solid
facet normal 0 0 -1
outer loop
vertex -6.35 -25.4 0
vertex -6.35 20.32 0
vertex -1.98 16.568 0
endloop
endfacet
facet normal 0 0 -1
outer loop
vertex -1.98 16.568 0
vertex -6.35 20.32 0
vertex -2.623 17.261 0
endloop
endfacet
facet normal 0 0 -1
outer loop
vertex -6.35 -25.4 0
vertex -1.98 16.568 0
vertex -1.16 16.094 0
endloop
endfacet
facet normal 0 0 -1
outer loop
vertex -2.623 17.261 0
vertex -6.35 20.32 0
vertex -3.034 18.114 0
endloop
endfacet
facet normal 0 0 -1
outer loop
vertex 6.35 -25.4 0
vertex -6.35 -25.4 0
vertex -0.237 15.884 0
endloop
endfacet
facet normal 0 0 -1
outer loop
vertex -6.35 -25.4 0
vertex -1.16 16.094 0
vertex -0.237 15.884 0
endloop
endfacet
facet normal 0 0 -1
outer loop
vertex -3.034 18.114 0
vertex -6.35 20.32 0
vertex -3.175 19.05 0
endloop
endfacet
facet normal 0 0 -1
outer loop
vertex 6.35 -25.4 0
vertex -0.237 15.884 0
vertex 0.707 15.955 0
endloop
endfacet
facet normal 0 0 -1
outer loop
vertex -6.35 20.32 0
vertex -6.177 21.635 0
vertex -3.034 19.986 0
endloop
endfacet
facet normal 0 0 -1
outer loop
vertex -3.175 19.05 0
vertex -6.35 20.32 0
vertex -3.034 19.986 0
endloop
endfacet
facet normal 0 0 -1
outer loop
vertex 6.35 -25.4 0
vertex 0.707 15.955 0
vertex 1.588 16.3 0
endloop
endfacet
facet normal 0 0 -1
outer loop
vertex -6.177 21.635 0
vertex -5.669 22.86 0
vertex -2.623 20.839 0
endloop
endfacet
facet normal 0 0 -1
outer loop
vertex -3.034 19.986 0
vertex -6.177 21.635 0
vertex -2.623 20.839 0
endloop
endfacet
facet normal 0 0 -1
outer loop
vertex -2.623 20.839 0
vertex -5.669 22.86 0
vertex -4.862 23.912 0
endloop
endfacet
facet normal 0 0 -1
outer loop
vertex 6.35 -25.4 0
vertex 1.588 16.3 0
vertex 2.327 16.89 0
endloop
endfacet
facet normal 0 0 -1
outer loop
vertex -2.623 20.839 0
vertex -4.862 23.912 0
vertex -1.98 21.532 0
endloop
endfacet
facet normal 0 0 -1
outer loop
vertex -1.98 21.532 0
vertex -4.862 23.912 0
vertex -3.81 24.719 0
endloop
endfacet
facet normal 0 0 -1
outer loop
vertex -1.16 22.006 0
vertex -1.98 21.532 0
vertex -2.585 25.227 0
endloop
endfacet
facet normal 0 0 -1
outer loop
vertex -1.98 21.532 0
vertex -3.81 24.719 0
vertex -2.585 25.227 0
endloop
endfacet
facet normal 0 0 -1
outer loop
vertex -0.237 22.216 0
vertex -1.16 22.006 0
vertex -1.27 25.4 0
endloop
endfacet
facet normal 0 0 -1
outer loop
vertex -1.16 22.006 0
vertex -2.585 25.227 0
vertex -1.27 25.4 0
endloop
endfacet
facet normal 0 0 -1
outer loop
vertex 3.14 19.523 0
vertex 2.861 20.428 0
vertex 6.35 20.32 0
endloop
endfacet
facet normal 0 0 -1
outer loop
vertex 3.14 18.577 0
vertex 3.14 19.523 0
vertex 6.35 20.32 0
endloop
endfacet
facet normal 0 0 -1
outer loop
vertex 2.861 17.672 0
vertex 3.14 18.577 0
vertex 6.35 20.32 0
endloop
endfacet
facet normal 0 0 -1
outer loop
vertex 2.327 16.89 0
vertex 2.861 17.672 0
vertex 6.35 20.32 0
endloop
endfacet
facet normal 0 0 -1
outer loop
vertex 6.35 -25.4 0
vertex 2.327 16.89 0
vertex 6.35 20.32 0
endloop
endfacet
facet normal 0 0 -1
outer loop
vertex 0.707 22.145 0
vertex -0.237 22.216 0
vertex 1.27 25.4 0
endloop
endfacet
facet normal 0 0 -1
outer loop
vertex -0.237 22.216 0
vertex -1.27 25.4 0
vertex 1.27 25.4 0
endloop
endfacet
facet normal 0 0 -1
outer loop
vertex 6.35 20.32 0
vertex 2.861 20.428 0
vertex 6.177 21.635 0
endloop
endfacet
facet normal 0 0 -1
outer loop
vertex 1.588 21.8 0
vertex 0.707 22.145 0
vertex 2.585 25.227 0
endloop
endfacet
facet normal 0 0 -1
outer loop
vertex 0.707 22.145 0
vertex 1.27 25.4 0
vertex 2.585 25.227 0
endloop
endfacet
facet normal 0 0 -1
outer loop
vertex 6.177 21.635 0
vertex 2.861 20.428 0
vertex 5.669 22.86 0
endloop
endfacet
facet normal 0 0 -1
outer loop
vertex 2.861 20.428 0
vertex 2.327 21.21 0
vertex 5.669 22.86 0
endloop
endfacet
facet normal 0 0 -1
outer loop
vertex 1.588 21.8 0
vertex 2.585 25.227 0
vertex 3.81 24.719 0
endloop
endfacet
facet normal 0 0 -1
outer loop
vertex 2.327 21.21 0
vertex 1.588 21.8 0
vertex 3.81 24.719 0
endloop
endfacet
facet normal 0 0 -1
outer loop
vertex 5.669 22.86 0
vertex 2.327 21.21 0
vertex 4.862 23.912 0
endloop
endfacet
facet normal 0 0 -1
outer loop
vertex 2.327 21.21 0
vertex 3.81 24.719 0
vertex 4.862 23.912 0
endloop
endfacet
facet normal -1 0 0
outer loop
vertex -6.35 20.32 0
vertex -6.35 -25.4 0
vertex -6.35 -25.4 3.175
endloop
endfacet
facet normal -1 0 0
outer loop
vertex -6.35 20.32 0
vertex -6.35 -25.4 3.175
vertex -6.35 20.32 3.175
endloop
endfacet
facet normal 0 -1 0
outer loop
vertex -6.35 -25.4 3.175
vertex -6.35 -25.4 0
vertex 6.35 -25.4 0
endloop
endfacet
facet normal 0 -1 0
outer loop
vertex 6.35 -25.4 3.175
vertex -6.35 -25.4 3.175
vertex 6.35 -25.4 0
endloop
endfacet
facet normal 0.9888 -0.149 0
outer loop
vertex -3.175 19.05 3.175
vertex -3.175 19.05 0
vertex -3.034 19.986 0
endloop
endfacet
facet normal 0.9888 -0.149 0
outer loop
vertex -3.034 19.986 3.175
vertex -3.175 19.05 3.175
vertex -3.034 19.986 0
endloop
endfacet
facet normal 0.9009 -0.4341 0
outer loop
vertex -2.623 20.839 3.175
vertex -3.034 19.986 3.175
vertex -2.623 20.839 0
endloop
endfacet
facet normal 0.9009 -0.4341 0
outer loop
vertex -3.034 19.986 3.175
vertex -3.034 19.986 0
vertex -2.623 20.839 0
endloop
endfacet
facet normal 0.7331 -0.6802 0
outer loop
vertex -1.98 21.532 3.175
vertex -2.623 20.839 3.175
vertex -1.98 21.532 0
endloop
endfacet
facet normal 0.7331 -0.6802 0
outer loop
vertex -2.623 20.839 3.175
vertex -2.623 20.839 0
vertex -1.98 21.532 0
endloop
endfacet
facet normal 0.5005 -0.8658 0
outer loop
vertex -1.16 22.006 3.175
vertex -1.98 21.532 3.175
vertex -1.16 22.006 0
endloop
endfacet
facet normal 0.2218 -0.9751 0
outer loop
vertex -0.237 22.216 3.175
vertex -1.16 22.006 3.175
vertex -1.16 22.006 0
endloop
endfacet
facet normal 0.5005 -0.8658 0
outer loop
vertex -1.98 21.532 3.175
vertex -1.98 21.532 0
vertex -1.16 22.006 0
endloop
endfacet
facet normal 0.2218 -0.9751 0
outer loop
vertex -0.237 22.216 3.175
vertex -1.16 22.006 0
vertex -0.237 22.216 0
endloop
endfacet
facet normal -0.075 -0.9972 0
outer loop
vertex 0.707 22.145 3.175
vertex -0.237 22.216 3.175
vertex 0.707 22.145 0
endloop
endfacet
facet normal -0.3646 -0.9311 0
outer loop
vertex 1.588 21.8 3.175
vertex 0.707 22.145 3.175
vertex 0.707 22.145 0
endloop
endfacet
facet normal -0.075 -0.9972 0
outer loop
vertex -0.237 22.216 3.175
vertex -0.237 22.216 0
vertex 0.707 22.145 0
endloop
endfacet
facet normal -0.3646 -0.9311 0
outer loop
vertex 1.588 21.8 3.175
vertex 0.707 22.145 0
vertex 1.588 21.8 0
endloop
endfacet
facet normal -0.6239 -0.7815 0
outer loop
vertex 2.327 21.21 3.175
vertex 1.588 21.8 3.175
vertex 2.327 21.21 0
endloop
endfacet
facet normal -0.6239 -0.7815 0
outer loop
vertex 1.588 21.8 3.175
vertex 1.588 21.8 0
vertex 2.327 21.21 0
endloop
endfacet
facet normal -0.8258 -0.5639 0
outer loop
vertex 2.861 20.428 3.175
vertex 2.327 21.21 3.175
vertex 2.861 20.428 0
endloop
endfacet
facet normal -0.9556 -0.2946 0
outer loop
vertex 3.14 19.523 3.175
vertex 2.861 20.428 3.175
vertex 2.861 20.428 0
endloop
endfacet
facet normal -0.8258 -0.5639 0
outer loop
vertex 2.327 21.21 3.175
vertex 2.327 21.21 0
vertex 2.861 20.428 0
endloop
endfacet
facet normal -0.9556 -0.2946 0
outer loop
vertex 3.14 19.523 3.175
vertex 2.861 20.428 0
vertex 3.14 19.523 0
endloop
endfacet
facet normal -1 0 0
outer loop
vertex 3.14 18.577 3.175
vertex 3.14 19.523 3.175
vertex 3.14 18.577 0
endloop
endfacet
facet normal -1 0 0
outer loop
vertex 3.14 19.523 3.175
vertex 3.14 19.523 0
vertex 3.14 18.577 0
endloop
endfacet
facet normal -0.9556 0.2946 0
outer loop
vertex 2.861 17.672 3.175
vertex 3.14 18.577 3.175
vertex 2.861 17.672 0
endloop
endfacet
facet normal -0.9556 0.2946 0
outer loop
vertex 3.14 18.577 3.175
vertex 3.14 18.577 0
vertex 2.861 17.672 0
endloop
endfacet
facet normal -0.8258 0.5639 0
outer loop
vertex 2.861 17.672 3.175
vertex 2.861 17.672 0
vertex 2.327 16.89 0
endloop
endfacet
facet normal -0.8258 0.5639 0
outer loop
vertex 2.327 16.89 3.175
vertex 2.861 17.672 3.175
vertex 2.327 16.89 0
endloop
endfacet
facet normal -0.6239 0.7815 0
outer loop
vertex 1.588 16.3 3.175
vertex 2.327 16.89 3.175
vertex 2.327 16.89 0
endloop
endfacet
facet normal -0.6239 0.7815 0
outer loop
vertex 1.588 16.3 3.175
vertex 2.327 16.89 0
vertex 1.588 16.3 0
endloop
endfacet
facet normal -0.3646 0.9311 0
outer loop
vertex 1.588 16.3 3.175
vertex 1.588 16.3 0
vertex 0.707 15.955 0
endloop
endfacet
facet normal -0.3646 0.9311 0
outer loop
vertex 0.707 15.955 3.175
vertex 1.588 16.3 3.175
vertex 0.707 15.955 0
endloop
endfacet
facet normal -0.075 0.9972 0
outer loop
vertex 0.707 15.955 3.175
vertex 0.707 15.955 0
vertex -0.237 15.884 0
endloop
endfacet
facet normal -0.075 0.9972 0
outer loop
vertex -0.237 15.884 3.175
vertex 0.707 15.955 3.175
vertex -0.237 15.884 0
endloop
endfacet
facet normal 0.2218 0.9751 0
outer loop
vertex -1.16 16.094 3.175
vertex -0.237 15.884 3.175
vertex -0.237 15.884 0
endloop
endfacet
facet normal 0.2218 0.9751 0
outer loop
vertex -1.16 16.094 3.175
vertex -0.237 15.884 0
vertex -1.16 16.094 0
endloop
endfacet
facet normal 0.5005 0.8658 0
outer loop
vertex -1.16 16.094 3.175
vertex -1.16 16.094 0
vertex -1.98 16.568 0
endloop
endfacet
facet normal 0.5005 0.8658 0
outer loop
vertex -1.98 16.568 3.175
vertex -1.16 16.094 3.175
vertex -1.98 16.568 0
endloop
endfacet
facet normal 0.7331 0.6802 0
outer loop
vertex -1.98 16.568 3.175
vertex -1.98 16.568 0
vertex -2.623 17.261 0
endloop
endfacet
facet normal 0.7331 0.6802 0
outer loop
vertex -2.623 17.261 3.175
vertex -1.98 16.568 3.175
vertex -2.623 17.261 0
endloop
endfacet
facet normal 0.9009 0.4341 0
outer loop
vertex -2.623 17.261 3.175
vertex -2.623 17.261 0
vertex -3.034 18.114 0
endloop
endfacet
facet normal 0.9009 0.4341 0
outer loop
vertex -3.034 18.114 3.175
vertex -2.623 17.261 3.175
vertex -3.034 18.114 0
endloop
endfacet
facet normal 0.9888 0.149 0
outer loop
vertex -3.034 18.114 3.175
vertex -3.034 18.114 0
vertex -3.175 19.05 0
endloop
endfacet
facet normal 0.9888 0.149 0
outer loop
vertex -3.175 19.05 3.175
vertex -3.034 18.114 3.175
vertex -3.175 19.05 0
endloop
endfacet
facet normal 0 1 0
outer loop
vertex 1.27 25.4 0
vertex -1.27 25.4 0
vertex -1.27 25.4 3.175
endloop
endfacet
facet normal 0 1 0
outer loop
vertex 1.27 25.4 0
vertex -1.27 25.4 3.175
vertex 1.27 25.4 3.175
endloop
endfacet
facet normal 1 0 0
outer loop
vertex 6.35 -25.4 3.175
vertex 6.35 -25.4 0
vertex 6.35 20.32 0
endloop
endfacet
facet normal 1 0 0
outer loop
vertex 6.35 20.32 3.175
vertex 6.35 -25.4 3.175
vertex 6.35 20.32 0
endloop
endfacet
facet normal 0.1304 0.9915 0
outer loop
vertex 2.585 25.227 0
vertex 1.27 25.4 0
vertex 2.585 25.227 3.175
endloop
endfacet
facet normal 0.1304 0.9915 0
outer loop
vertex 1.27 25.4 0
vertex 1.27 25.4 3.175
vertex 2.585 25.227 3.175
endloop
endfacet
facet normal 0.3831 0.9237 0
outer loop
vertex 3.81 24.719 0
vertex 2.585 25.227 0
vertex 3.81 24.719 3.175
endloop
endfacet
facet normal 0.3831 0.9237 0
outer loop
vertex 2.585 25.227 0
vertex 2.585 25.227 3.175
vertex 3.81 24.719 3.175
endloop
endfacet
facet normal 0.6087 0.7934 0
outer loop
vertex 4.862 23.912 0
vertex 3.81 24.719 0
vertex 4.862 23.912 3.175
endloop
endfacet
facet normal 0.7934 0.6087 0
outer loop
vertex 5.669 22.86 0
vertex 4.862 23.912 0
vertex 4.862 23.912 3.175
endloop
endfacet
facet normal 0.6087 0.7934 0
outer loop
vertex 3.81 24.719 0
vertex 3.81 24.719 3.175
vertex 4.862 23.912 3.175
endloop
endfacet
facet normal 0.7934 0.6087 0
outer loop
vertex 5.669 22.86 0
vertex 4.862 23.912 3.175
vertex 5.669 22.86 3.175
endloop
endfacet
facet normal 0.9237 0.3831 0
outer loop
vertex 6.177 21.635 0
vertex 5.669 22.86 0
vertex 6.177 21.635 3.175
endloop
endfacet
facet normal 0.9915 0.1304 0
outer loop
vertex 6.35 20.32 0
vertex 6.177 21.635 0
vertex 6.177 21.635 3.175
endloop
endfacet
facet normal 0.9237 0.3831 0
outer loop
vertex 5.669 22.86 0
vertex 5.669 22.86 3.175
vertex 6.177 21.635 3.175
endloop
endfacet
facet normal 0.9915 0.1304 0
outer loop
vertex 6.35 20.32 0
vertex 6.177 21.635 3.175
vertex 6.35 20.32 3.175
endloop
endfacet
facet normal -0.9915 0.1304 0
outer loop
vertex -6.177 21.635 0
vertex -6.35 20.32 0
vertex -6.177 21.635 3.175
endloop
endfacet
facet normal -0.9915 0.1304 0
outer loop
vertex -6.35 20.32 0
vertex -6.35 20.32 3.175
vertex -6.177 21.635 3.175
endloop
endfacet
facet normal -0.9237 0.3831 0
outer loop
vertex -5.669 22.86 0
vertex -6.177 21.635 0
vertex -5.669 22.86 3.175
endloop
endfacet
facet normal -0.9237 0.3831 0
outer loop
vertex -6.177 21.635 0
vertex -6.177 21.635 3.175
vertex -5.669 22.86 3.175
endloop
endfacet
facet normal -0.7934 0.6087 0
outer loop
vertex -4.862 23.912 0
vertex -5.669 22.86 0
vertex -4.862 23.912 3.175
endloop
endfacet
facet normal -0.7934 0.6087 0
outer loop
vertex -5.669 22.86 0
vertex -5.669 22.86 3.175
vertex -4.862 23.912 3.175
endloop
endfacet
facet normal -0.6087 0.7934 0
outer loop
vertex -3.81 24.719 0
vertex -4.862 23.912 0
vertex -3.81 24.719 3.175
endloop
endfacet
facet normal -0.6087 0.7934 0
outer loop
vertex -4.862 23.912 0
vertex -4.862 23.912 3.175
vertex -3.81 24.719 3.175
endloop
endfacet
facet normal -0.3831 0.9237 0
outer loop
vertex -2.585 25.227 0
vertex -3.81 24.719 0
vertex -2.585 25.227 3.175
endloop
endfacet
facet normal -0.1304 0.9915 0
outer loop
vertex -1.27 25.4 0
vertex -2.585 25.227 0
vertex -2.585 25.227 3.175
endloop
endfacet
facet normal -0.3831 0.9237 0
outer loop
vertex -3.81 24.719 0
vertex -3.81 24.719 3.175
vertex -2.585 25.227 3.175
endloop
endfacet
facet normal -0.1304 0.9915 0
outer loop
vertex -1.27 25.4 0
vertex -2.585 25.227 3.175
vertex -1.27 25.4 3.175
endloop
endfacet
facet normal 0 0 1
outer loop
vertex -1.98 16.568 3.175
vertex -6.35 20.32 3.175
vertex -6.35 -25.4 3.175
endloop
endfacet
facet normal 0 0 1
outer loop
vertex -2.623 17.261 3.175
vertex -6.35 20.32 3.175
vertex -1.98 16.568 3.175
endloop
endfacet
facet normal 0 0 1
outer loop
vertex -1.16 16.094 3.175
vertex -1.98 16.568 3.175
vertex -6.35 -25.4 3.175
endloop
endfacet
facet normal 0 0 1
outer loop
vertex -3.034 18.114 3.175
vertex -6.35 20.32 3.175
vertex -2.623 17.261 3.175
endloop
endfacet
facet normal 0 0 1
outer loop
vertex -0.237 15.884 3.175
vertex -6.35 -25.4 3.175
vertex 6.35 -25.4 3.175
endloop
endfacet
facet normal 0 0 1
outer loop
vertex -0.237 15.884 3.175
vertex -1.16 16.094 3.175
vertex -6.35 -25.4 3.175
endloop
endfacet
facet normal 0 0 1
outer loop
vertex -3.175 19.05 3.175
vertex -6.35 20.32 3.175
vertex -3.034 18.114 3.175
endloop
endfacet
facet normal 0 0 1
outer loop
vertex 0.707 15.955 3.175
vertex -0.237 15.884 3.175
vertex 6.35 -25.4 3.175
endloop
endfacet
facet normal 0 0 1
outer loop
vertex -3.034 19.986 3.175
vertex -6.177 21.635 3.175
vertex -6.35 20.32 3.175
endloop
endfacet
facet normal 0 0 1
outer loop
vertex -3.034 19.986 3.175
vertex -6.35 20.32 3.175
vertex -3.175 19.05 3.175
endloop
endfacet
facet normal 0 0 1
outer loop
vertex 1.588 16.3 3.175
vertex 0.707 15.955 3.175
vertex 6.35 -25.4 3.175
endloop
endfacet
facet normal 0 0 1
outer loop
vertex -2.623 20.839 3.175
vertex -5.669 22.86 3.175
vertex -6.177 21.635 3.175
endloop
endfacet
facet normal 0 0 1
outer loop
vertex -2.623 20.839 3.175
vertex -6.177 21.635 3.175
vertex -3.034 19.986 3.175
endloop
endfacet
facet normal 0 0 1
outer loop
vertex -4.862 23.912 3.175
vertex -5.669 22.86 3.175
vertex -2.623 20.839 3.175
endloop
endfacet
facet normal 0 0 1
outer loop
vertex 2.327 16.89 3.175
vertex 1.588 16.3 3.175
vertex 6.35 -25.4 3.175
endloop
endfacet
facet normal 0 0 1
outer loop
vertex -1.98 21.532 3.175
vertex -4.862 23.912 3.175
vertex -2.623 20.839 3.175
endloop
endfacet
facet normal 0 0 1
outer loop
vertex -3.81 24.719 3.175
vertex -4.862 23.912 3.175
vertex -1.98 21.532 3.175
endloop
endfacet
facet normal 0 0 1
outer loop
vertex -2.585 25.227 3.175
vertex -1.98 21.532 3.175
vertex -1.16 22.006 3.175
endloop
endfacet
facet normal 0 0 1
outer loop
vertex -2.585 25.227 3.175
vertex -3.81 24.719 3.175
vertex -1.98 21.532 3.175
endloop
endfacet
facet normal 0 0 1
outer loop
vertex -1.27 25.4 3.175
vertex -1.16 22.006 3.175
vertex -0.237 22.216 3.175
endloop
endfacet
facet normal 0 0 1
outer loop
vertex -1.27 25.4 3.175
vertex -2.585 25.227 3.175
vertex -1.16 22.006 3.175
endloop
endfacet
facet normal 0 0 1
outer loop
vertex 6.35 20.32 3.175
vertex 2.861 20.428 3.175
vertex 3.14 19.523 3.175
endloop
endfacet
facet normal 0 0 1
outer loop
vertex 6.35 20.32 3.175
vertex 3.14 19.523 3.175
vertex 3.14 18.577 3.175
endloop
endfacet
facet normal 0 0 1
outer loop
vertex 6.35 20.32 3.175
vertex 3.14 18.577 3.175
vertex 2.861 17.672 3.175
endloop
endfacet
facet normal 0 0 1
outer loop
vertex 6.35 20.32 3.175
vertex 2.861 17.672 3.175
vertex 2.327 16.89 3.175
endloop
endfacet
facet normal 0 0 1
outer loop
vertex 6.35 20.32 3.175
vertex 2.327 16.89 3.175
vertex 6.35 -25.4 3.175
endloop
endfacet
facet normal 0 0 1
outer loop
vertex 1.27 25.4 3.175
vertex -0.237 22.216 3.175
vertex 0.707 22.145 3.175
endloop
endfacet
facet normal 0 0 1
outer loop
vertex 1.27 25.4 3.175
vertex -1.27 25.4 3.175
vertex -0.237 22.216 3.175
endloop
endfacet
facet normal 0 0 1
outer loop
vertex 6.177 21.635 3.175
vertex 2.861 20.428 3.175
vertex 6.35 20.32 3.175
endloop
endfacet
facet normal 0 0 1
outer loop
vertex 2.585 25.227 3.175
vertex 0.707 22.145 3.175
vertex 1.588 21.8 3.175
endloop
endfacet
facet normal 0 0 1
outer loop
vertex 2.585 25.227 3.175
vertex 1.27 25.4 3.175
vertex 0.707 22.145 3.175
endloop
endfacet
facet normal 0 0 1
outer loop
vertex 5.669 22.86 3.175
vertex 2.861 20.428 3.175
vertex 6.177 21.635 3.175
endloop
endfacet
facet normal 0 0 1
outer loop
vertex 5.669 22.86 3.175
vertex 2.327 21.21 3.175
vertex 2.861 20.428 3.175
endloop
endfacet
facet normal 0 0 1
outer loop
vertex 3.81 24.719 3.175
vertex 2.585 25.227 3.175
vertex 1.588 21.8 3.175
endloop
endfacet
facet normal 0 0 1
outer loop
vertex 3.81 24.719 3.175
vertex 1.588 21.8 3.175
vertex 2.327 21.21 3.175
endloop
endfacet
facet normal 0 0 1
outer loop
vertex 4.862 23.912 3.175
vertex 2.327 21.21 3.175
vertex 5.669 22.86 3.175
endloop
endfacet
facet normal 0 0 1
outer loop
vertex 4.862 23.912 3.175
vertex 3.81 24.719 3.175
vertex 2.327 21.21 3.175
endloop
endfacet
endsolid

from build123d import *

# Parameters (mm, degrees)
SKETCH1_W                       = 12.7
SKETCH1_H                       = 50.8
EXTRUDE1_DEPTH                  = 3.175
F_1_4_0_25_DIAMETER_HOLE1_D     = 6.35
F_1_4_0_25_DIAMETER_HOLE1_DEPTH = 6.35
F_1_4_0_25_DIAMETER_HOLE1_TIP   = 1.907732465
FILLET1_R                       = 5.08


with BuildPart() as part:
    # Sketch1 → Extrude1 (new body)
    with BuildSketch(Plane.XY):
        Rectangle(SKETCH1_W, SKETCH1_H)
    extrude(amount=EXTRUDE1_DEPTH)

    # 1/4 (0.25) Diameter Hole1
    with Locations(Plane(origin=(0, 19.05, 3.175), x_dir=(1, 0, 0), z_dir=(0, 0, 1))):
        with Locations((0, 0)):
            Hole(F_1_4_0_25_DIAMETER_HOLE1_D / 2, depth=F_1_4_0_25_DIAMETER_HOLE1_DEPTH)
            with Locations((0, 0, -(F_1_4_0_25_DIAMETER_HOLE1_DEPTH + F_1_4_0_25_DIAMETER_HOLE1_TIP / 2))):  # 118° drill point
                Cone(0, F_1_4_0_25_DIAMETER_HOLE1_D / 2, F_1_4_0_25_DIAMETER_HOLE1_TIP, mode=Mode.SUBTRACT)

    # Fillet1
    fillet1_edges = [part.edges().sort_by_distance(p)[0] for p in [
        (-6.35, 25.4, 1.5875),
        (6.35, 25.4, 1.5875),
    ]]
    fillet(fillet1_edges, radius=FILLET1_R)


solid = part.part
